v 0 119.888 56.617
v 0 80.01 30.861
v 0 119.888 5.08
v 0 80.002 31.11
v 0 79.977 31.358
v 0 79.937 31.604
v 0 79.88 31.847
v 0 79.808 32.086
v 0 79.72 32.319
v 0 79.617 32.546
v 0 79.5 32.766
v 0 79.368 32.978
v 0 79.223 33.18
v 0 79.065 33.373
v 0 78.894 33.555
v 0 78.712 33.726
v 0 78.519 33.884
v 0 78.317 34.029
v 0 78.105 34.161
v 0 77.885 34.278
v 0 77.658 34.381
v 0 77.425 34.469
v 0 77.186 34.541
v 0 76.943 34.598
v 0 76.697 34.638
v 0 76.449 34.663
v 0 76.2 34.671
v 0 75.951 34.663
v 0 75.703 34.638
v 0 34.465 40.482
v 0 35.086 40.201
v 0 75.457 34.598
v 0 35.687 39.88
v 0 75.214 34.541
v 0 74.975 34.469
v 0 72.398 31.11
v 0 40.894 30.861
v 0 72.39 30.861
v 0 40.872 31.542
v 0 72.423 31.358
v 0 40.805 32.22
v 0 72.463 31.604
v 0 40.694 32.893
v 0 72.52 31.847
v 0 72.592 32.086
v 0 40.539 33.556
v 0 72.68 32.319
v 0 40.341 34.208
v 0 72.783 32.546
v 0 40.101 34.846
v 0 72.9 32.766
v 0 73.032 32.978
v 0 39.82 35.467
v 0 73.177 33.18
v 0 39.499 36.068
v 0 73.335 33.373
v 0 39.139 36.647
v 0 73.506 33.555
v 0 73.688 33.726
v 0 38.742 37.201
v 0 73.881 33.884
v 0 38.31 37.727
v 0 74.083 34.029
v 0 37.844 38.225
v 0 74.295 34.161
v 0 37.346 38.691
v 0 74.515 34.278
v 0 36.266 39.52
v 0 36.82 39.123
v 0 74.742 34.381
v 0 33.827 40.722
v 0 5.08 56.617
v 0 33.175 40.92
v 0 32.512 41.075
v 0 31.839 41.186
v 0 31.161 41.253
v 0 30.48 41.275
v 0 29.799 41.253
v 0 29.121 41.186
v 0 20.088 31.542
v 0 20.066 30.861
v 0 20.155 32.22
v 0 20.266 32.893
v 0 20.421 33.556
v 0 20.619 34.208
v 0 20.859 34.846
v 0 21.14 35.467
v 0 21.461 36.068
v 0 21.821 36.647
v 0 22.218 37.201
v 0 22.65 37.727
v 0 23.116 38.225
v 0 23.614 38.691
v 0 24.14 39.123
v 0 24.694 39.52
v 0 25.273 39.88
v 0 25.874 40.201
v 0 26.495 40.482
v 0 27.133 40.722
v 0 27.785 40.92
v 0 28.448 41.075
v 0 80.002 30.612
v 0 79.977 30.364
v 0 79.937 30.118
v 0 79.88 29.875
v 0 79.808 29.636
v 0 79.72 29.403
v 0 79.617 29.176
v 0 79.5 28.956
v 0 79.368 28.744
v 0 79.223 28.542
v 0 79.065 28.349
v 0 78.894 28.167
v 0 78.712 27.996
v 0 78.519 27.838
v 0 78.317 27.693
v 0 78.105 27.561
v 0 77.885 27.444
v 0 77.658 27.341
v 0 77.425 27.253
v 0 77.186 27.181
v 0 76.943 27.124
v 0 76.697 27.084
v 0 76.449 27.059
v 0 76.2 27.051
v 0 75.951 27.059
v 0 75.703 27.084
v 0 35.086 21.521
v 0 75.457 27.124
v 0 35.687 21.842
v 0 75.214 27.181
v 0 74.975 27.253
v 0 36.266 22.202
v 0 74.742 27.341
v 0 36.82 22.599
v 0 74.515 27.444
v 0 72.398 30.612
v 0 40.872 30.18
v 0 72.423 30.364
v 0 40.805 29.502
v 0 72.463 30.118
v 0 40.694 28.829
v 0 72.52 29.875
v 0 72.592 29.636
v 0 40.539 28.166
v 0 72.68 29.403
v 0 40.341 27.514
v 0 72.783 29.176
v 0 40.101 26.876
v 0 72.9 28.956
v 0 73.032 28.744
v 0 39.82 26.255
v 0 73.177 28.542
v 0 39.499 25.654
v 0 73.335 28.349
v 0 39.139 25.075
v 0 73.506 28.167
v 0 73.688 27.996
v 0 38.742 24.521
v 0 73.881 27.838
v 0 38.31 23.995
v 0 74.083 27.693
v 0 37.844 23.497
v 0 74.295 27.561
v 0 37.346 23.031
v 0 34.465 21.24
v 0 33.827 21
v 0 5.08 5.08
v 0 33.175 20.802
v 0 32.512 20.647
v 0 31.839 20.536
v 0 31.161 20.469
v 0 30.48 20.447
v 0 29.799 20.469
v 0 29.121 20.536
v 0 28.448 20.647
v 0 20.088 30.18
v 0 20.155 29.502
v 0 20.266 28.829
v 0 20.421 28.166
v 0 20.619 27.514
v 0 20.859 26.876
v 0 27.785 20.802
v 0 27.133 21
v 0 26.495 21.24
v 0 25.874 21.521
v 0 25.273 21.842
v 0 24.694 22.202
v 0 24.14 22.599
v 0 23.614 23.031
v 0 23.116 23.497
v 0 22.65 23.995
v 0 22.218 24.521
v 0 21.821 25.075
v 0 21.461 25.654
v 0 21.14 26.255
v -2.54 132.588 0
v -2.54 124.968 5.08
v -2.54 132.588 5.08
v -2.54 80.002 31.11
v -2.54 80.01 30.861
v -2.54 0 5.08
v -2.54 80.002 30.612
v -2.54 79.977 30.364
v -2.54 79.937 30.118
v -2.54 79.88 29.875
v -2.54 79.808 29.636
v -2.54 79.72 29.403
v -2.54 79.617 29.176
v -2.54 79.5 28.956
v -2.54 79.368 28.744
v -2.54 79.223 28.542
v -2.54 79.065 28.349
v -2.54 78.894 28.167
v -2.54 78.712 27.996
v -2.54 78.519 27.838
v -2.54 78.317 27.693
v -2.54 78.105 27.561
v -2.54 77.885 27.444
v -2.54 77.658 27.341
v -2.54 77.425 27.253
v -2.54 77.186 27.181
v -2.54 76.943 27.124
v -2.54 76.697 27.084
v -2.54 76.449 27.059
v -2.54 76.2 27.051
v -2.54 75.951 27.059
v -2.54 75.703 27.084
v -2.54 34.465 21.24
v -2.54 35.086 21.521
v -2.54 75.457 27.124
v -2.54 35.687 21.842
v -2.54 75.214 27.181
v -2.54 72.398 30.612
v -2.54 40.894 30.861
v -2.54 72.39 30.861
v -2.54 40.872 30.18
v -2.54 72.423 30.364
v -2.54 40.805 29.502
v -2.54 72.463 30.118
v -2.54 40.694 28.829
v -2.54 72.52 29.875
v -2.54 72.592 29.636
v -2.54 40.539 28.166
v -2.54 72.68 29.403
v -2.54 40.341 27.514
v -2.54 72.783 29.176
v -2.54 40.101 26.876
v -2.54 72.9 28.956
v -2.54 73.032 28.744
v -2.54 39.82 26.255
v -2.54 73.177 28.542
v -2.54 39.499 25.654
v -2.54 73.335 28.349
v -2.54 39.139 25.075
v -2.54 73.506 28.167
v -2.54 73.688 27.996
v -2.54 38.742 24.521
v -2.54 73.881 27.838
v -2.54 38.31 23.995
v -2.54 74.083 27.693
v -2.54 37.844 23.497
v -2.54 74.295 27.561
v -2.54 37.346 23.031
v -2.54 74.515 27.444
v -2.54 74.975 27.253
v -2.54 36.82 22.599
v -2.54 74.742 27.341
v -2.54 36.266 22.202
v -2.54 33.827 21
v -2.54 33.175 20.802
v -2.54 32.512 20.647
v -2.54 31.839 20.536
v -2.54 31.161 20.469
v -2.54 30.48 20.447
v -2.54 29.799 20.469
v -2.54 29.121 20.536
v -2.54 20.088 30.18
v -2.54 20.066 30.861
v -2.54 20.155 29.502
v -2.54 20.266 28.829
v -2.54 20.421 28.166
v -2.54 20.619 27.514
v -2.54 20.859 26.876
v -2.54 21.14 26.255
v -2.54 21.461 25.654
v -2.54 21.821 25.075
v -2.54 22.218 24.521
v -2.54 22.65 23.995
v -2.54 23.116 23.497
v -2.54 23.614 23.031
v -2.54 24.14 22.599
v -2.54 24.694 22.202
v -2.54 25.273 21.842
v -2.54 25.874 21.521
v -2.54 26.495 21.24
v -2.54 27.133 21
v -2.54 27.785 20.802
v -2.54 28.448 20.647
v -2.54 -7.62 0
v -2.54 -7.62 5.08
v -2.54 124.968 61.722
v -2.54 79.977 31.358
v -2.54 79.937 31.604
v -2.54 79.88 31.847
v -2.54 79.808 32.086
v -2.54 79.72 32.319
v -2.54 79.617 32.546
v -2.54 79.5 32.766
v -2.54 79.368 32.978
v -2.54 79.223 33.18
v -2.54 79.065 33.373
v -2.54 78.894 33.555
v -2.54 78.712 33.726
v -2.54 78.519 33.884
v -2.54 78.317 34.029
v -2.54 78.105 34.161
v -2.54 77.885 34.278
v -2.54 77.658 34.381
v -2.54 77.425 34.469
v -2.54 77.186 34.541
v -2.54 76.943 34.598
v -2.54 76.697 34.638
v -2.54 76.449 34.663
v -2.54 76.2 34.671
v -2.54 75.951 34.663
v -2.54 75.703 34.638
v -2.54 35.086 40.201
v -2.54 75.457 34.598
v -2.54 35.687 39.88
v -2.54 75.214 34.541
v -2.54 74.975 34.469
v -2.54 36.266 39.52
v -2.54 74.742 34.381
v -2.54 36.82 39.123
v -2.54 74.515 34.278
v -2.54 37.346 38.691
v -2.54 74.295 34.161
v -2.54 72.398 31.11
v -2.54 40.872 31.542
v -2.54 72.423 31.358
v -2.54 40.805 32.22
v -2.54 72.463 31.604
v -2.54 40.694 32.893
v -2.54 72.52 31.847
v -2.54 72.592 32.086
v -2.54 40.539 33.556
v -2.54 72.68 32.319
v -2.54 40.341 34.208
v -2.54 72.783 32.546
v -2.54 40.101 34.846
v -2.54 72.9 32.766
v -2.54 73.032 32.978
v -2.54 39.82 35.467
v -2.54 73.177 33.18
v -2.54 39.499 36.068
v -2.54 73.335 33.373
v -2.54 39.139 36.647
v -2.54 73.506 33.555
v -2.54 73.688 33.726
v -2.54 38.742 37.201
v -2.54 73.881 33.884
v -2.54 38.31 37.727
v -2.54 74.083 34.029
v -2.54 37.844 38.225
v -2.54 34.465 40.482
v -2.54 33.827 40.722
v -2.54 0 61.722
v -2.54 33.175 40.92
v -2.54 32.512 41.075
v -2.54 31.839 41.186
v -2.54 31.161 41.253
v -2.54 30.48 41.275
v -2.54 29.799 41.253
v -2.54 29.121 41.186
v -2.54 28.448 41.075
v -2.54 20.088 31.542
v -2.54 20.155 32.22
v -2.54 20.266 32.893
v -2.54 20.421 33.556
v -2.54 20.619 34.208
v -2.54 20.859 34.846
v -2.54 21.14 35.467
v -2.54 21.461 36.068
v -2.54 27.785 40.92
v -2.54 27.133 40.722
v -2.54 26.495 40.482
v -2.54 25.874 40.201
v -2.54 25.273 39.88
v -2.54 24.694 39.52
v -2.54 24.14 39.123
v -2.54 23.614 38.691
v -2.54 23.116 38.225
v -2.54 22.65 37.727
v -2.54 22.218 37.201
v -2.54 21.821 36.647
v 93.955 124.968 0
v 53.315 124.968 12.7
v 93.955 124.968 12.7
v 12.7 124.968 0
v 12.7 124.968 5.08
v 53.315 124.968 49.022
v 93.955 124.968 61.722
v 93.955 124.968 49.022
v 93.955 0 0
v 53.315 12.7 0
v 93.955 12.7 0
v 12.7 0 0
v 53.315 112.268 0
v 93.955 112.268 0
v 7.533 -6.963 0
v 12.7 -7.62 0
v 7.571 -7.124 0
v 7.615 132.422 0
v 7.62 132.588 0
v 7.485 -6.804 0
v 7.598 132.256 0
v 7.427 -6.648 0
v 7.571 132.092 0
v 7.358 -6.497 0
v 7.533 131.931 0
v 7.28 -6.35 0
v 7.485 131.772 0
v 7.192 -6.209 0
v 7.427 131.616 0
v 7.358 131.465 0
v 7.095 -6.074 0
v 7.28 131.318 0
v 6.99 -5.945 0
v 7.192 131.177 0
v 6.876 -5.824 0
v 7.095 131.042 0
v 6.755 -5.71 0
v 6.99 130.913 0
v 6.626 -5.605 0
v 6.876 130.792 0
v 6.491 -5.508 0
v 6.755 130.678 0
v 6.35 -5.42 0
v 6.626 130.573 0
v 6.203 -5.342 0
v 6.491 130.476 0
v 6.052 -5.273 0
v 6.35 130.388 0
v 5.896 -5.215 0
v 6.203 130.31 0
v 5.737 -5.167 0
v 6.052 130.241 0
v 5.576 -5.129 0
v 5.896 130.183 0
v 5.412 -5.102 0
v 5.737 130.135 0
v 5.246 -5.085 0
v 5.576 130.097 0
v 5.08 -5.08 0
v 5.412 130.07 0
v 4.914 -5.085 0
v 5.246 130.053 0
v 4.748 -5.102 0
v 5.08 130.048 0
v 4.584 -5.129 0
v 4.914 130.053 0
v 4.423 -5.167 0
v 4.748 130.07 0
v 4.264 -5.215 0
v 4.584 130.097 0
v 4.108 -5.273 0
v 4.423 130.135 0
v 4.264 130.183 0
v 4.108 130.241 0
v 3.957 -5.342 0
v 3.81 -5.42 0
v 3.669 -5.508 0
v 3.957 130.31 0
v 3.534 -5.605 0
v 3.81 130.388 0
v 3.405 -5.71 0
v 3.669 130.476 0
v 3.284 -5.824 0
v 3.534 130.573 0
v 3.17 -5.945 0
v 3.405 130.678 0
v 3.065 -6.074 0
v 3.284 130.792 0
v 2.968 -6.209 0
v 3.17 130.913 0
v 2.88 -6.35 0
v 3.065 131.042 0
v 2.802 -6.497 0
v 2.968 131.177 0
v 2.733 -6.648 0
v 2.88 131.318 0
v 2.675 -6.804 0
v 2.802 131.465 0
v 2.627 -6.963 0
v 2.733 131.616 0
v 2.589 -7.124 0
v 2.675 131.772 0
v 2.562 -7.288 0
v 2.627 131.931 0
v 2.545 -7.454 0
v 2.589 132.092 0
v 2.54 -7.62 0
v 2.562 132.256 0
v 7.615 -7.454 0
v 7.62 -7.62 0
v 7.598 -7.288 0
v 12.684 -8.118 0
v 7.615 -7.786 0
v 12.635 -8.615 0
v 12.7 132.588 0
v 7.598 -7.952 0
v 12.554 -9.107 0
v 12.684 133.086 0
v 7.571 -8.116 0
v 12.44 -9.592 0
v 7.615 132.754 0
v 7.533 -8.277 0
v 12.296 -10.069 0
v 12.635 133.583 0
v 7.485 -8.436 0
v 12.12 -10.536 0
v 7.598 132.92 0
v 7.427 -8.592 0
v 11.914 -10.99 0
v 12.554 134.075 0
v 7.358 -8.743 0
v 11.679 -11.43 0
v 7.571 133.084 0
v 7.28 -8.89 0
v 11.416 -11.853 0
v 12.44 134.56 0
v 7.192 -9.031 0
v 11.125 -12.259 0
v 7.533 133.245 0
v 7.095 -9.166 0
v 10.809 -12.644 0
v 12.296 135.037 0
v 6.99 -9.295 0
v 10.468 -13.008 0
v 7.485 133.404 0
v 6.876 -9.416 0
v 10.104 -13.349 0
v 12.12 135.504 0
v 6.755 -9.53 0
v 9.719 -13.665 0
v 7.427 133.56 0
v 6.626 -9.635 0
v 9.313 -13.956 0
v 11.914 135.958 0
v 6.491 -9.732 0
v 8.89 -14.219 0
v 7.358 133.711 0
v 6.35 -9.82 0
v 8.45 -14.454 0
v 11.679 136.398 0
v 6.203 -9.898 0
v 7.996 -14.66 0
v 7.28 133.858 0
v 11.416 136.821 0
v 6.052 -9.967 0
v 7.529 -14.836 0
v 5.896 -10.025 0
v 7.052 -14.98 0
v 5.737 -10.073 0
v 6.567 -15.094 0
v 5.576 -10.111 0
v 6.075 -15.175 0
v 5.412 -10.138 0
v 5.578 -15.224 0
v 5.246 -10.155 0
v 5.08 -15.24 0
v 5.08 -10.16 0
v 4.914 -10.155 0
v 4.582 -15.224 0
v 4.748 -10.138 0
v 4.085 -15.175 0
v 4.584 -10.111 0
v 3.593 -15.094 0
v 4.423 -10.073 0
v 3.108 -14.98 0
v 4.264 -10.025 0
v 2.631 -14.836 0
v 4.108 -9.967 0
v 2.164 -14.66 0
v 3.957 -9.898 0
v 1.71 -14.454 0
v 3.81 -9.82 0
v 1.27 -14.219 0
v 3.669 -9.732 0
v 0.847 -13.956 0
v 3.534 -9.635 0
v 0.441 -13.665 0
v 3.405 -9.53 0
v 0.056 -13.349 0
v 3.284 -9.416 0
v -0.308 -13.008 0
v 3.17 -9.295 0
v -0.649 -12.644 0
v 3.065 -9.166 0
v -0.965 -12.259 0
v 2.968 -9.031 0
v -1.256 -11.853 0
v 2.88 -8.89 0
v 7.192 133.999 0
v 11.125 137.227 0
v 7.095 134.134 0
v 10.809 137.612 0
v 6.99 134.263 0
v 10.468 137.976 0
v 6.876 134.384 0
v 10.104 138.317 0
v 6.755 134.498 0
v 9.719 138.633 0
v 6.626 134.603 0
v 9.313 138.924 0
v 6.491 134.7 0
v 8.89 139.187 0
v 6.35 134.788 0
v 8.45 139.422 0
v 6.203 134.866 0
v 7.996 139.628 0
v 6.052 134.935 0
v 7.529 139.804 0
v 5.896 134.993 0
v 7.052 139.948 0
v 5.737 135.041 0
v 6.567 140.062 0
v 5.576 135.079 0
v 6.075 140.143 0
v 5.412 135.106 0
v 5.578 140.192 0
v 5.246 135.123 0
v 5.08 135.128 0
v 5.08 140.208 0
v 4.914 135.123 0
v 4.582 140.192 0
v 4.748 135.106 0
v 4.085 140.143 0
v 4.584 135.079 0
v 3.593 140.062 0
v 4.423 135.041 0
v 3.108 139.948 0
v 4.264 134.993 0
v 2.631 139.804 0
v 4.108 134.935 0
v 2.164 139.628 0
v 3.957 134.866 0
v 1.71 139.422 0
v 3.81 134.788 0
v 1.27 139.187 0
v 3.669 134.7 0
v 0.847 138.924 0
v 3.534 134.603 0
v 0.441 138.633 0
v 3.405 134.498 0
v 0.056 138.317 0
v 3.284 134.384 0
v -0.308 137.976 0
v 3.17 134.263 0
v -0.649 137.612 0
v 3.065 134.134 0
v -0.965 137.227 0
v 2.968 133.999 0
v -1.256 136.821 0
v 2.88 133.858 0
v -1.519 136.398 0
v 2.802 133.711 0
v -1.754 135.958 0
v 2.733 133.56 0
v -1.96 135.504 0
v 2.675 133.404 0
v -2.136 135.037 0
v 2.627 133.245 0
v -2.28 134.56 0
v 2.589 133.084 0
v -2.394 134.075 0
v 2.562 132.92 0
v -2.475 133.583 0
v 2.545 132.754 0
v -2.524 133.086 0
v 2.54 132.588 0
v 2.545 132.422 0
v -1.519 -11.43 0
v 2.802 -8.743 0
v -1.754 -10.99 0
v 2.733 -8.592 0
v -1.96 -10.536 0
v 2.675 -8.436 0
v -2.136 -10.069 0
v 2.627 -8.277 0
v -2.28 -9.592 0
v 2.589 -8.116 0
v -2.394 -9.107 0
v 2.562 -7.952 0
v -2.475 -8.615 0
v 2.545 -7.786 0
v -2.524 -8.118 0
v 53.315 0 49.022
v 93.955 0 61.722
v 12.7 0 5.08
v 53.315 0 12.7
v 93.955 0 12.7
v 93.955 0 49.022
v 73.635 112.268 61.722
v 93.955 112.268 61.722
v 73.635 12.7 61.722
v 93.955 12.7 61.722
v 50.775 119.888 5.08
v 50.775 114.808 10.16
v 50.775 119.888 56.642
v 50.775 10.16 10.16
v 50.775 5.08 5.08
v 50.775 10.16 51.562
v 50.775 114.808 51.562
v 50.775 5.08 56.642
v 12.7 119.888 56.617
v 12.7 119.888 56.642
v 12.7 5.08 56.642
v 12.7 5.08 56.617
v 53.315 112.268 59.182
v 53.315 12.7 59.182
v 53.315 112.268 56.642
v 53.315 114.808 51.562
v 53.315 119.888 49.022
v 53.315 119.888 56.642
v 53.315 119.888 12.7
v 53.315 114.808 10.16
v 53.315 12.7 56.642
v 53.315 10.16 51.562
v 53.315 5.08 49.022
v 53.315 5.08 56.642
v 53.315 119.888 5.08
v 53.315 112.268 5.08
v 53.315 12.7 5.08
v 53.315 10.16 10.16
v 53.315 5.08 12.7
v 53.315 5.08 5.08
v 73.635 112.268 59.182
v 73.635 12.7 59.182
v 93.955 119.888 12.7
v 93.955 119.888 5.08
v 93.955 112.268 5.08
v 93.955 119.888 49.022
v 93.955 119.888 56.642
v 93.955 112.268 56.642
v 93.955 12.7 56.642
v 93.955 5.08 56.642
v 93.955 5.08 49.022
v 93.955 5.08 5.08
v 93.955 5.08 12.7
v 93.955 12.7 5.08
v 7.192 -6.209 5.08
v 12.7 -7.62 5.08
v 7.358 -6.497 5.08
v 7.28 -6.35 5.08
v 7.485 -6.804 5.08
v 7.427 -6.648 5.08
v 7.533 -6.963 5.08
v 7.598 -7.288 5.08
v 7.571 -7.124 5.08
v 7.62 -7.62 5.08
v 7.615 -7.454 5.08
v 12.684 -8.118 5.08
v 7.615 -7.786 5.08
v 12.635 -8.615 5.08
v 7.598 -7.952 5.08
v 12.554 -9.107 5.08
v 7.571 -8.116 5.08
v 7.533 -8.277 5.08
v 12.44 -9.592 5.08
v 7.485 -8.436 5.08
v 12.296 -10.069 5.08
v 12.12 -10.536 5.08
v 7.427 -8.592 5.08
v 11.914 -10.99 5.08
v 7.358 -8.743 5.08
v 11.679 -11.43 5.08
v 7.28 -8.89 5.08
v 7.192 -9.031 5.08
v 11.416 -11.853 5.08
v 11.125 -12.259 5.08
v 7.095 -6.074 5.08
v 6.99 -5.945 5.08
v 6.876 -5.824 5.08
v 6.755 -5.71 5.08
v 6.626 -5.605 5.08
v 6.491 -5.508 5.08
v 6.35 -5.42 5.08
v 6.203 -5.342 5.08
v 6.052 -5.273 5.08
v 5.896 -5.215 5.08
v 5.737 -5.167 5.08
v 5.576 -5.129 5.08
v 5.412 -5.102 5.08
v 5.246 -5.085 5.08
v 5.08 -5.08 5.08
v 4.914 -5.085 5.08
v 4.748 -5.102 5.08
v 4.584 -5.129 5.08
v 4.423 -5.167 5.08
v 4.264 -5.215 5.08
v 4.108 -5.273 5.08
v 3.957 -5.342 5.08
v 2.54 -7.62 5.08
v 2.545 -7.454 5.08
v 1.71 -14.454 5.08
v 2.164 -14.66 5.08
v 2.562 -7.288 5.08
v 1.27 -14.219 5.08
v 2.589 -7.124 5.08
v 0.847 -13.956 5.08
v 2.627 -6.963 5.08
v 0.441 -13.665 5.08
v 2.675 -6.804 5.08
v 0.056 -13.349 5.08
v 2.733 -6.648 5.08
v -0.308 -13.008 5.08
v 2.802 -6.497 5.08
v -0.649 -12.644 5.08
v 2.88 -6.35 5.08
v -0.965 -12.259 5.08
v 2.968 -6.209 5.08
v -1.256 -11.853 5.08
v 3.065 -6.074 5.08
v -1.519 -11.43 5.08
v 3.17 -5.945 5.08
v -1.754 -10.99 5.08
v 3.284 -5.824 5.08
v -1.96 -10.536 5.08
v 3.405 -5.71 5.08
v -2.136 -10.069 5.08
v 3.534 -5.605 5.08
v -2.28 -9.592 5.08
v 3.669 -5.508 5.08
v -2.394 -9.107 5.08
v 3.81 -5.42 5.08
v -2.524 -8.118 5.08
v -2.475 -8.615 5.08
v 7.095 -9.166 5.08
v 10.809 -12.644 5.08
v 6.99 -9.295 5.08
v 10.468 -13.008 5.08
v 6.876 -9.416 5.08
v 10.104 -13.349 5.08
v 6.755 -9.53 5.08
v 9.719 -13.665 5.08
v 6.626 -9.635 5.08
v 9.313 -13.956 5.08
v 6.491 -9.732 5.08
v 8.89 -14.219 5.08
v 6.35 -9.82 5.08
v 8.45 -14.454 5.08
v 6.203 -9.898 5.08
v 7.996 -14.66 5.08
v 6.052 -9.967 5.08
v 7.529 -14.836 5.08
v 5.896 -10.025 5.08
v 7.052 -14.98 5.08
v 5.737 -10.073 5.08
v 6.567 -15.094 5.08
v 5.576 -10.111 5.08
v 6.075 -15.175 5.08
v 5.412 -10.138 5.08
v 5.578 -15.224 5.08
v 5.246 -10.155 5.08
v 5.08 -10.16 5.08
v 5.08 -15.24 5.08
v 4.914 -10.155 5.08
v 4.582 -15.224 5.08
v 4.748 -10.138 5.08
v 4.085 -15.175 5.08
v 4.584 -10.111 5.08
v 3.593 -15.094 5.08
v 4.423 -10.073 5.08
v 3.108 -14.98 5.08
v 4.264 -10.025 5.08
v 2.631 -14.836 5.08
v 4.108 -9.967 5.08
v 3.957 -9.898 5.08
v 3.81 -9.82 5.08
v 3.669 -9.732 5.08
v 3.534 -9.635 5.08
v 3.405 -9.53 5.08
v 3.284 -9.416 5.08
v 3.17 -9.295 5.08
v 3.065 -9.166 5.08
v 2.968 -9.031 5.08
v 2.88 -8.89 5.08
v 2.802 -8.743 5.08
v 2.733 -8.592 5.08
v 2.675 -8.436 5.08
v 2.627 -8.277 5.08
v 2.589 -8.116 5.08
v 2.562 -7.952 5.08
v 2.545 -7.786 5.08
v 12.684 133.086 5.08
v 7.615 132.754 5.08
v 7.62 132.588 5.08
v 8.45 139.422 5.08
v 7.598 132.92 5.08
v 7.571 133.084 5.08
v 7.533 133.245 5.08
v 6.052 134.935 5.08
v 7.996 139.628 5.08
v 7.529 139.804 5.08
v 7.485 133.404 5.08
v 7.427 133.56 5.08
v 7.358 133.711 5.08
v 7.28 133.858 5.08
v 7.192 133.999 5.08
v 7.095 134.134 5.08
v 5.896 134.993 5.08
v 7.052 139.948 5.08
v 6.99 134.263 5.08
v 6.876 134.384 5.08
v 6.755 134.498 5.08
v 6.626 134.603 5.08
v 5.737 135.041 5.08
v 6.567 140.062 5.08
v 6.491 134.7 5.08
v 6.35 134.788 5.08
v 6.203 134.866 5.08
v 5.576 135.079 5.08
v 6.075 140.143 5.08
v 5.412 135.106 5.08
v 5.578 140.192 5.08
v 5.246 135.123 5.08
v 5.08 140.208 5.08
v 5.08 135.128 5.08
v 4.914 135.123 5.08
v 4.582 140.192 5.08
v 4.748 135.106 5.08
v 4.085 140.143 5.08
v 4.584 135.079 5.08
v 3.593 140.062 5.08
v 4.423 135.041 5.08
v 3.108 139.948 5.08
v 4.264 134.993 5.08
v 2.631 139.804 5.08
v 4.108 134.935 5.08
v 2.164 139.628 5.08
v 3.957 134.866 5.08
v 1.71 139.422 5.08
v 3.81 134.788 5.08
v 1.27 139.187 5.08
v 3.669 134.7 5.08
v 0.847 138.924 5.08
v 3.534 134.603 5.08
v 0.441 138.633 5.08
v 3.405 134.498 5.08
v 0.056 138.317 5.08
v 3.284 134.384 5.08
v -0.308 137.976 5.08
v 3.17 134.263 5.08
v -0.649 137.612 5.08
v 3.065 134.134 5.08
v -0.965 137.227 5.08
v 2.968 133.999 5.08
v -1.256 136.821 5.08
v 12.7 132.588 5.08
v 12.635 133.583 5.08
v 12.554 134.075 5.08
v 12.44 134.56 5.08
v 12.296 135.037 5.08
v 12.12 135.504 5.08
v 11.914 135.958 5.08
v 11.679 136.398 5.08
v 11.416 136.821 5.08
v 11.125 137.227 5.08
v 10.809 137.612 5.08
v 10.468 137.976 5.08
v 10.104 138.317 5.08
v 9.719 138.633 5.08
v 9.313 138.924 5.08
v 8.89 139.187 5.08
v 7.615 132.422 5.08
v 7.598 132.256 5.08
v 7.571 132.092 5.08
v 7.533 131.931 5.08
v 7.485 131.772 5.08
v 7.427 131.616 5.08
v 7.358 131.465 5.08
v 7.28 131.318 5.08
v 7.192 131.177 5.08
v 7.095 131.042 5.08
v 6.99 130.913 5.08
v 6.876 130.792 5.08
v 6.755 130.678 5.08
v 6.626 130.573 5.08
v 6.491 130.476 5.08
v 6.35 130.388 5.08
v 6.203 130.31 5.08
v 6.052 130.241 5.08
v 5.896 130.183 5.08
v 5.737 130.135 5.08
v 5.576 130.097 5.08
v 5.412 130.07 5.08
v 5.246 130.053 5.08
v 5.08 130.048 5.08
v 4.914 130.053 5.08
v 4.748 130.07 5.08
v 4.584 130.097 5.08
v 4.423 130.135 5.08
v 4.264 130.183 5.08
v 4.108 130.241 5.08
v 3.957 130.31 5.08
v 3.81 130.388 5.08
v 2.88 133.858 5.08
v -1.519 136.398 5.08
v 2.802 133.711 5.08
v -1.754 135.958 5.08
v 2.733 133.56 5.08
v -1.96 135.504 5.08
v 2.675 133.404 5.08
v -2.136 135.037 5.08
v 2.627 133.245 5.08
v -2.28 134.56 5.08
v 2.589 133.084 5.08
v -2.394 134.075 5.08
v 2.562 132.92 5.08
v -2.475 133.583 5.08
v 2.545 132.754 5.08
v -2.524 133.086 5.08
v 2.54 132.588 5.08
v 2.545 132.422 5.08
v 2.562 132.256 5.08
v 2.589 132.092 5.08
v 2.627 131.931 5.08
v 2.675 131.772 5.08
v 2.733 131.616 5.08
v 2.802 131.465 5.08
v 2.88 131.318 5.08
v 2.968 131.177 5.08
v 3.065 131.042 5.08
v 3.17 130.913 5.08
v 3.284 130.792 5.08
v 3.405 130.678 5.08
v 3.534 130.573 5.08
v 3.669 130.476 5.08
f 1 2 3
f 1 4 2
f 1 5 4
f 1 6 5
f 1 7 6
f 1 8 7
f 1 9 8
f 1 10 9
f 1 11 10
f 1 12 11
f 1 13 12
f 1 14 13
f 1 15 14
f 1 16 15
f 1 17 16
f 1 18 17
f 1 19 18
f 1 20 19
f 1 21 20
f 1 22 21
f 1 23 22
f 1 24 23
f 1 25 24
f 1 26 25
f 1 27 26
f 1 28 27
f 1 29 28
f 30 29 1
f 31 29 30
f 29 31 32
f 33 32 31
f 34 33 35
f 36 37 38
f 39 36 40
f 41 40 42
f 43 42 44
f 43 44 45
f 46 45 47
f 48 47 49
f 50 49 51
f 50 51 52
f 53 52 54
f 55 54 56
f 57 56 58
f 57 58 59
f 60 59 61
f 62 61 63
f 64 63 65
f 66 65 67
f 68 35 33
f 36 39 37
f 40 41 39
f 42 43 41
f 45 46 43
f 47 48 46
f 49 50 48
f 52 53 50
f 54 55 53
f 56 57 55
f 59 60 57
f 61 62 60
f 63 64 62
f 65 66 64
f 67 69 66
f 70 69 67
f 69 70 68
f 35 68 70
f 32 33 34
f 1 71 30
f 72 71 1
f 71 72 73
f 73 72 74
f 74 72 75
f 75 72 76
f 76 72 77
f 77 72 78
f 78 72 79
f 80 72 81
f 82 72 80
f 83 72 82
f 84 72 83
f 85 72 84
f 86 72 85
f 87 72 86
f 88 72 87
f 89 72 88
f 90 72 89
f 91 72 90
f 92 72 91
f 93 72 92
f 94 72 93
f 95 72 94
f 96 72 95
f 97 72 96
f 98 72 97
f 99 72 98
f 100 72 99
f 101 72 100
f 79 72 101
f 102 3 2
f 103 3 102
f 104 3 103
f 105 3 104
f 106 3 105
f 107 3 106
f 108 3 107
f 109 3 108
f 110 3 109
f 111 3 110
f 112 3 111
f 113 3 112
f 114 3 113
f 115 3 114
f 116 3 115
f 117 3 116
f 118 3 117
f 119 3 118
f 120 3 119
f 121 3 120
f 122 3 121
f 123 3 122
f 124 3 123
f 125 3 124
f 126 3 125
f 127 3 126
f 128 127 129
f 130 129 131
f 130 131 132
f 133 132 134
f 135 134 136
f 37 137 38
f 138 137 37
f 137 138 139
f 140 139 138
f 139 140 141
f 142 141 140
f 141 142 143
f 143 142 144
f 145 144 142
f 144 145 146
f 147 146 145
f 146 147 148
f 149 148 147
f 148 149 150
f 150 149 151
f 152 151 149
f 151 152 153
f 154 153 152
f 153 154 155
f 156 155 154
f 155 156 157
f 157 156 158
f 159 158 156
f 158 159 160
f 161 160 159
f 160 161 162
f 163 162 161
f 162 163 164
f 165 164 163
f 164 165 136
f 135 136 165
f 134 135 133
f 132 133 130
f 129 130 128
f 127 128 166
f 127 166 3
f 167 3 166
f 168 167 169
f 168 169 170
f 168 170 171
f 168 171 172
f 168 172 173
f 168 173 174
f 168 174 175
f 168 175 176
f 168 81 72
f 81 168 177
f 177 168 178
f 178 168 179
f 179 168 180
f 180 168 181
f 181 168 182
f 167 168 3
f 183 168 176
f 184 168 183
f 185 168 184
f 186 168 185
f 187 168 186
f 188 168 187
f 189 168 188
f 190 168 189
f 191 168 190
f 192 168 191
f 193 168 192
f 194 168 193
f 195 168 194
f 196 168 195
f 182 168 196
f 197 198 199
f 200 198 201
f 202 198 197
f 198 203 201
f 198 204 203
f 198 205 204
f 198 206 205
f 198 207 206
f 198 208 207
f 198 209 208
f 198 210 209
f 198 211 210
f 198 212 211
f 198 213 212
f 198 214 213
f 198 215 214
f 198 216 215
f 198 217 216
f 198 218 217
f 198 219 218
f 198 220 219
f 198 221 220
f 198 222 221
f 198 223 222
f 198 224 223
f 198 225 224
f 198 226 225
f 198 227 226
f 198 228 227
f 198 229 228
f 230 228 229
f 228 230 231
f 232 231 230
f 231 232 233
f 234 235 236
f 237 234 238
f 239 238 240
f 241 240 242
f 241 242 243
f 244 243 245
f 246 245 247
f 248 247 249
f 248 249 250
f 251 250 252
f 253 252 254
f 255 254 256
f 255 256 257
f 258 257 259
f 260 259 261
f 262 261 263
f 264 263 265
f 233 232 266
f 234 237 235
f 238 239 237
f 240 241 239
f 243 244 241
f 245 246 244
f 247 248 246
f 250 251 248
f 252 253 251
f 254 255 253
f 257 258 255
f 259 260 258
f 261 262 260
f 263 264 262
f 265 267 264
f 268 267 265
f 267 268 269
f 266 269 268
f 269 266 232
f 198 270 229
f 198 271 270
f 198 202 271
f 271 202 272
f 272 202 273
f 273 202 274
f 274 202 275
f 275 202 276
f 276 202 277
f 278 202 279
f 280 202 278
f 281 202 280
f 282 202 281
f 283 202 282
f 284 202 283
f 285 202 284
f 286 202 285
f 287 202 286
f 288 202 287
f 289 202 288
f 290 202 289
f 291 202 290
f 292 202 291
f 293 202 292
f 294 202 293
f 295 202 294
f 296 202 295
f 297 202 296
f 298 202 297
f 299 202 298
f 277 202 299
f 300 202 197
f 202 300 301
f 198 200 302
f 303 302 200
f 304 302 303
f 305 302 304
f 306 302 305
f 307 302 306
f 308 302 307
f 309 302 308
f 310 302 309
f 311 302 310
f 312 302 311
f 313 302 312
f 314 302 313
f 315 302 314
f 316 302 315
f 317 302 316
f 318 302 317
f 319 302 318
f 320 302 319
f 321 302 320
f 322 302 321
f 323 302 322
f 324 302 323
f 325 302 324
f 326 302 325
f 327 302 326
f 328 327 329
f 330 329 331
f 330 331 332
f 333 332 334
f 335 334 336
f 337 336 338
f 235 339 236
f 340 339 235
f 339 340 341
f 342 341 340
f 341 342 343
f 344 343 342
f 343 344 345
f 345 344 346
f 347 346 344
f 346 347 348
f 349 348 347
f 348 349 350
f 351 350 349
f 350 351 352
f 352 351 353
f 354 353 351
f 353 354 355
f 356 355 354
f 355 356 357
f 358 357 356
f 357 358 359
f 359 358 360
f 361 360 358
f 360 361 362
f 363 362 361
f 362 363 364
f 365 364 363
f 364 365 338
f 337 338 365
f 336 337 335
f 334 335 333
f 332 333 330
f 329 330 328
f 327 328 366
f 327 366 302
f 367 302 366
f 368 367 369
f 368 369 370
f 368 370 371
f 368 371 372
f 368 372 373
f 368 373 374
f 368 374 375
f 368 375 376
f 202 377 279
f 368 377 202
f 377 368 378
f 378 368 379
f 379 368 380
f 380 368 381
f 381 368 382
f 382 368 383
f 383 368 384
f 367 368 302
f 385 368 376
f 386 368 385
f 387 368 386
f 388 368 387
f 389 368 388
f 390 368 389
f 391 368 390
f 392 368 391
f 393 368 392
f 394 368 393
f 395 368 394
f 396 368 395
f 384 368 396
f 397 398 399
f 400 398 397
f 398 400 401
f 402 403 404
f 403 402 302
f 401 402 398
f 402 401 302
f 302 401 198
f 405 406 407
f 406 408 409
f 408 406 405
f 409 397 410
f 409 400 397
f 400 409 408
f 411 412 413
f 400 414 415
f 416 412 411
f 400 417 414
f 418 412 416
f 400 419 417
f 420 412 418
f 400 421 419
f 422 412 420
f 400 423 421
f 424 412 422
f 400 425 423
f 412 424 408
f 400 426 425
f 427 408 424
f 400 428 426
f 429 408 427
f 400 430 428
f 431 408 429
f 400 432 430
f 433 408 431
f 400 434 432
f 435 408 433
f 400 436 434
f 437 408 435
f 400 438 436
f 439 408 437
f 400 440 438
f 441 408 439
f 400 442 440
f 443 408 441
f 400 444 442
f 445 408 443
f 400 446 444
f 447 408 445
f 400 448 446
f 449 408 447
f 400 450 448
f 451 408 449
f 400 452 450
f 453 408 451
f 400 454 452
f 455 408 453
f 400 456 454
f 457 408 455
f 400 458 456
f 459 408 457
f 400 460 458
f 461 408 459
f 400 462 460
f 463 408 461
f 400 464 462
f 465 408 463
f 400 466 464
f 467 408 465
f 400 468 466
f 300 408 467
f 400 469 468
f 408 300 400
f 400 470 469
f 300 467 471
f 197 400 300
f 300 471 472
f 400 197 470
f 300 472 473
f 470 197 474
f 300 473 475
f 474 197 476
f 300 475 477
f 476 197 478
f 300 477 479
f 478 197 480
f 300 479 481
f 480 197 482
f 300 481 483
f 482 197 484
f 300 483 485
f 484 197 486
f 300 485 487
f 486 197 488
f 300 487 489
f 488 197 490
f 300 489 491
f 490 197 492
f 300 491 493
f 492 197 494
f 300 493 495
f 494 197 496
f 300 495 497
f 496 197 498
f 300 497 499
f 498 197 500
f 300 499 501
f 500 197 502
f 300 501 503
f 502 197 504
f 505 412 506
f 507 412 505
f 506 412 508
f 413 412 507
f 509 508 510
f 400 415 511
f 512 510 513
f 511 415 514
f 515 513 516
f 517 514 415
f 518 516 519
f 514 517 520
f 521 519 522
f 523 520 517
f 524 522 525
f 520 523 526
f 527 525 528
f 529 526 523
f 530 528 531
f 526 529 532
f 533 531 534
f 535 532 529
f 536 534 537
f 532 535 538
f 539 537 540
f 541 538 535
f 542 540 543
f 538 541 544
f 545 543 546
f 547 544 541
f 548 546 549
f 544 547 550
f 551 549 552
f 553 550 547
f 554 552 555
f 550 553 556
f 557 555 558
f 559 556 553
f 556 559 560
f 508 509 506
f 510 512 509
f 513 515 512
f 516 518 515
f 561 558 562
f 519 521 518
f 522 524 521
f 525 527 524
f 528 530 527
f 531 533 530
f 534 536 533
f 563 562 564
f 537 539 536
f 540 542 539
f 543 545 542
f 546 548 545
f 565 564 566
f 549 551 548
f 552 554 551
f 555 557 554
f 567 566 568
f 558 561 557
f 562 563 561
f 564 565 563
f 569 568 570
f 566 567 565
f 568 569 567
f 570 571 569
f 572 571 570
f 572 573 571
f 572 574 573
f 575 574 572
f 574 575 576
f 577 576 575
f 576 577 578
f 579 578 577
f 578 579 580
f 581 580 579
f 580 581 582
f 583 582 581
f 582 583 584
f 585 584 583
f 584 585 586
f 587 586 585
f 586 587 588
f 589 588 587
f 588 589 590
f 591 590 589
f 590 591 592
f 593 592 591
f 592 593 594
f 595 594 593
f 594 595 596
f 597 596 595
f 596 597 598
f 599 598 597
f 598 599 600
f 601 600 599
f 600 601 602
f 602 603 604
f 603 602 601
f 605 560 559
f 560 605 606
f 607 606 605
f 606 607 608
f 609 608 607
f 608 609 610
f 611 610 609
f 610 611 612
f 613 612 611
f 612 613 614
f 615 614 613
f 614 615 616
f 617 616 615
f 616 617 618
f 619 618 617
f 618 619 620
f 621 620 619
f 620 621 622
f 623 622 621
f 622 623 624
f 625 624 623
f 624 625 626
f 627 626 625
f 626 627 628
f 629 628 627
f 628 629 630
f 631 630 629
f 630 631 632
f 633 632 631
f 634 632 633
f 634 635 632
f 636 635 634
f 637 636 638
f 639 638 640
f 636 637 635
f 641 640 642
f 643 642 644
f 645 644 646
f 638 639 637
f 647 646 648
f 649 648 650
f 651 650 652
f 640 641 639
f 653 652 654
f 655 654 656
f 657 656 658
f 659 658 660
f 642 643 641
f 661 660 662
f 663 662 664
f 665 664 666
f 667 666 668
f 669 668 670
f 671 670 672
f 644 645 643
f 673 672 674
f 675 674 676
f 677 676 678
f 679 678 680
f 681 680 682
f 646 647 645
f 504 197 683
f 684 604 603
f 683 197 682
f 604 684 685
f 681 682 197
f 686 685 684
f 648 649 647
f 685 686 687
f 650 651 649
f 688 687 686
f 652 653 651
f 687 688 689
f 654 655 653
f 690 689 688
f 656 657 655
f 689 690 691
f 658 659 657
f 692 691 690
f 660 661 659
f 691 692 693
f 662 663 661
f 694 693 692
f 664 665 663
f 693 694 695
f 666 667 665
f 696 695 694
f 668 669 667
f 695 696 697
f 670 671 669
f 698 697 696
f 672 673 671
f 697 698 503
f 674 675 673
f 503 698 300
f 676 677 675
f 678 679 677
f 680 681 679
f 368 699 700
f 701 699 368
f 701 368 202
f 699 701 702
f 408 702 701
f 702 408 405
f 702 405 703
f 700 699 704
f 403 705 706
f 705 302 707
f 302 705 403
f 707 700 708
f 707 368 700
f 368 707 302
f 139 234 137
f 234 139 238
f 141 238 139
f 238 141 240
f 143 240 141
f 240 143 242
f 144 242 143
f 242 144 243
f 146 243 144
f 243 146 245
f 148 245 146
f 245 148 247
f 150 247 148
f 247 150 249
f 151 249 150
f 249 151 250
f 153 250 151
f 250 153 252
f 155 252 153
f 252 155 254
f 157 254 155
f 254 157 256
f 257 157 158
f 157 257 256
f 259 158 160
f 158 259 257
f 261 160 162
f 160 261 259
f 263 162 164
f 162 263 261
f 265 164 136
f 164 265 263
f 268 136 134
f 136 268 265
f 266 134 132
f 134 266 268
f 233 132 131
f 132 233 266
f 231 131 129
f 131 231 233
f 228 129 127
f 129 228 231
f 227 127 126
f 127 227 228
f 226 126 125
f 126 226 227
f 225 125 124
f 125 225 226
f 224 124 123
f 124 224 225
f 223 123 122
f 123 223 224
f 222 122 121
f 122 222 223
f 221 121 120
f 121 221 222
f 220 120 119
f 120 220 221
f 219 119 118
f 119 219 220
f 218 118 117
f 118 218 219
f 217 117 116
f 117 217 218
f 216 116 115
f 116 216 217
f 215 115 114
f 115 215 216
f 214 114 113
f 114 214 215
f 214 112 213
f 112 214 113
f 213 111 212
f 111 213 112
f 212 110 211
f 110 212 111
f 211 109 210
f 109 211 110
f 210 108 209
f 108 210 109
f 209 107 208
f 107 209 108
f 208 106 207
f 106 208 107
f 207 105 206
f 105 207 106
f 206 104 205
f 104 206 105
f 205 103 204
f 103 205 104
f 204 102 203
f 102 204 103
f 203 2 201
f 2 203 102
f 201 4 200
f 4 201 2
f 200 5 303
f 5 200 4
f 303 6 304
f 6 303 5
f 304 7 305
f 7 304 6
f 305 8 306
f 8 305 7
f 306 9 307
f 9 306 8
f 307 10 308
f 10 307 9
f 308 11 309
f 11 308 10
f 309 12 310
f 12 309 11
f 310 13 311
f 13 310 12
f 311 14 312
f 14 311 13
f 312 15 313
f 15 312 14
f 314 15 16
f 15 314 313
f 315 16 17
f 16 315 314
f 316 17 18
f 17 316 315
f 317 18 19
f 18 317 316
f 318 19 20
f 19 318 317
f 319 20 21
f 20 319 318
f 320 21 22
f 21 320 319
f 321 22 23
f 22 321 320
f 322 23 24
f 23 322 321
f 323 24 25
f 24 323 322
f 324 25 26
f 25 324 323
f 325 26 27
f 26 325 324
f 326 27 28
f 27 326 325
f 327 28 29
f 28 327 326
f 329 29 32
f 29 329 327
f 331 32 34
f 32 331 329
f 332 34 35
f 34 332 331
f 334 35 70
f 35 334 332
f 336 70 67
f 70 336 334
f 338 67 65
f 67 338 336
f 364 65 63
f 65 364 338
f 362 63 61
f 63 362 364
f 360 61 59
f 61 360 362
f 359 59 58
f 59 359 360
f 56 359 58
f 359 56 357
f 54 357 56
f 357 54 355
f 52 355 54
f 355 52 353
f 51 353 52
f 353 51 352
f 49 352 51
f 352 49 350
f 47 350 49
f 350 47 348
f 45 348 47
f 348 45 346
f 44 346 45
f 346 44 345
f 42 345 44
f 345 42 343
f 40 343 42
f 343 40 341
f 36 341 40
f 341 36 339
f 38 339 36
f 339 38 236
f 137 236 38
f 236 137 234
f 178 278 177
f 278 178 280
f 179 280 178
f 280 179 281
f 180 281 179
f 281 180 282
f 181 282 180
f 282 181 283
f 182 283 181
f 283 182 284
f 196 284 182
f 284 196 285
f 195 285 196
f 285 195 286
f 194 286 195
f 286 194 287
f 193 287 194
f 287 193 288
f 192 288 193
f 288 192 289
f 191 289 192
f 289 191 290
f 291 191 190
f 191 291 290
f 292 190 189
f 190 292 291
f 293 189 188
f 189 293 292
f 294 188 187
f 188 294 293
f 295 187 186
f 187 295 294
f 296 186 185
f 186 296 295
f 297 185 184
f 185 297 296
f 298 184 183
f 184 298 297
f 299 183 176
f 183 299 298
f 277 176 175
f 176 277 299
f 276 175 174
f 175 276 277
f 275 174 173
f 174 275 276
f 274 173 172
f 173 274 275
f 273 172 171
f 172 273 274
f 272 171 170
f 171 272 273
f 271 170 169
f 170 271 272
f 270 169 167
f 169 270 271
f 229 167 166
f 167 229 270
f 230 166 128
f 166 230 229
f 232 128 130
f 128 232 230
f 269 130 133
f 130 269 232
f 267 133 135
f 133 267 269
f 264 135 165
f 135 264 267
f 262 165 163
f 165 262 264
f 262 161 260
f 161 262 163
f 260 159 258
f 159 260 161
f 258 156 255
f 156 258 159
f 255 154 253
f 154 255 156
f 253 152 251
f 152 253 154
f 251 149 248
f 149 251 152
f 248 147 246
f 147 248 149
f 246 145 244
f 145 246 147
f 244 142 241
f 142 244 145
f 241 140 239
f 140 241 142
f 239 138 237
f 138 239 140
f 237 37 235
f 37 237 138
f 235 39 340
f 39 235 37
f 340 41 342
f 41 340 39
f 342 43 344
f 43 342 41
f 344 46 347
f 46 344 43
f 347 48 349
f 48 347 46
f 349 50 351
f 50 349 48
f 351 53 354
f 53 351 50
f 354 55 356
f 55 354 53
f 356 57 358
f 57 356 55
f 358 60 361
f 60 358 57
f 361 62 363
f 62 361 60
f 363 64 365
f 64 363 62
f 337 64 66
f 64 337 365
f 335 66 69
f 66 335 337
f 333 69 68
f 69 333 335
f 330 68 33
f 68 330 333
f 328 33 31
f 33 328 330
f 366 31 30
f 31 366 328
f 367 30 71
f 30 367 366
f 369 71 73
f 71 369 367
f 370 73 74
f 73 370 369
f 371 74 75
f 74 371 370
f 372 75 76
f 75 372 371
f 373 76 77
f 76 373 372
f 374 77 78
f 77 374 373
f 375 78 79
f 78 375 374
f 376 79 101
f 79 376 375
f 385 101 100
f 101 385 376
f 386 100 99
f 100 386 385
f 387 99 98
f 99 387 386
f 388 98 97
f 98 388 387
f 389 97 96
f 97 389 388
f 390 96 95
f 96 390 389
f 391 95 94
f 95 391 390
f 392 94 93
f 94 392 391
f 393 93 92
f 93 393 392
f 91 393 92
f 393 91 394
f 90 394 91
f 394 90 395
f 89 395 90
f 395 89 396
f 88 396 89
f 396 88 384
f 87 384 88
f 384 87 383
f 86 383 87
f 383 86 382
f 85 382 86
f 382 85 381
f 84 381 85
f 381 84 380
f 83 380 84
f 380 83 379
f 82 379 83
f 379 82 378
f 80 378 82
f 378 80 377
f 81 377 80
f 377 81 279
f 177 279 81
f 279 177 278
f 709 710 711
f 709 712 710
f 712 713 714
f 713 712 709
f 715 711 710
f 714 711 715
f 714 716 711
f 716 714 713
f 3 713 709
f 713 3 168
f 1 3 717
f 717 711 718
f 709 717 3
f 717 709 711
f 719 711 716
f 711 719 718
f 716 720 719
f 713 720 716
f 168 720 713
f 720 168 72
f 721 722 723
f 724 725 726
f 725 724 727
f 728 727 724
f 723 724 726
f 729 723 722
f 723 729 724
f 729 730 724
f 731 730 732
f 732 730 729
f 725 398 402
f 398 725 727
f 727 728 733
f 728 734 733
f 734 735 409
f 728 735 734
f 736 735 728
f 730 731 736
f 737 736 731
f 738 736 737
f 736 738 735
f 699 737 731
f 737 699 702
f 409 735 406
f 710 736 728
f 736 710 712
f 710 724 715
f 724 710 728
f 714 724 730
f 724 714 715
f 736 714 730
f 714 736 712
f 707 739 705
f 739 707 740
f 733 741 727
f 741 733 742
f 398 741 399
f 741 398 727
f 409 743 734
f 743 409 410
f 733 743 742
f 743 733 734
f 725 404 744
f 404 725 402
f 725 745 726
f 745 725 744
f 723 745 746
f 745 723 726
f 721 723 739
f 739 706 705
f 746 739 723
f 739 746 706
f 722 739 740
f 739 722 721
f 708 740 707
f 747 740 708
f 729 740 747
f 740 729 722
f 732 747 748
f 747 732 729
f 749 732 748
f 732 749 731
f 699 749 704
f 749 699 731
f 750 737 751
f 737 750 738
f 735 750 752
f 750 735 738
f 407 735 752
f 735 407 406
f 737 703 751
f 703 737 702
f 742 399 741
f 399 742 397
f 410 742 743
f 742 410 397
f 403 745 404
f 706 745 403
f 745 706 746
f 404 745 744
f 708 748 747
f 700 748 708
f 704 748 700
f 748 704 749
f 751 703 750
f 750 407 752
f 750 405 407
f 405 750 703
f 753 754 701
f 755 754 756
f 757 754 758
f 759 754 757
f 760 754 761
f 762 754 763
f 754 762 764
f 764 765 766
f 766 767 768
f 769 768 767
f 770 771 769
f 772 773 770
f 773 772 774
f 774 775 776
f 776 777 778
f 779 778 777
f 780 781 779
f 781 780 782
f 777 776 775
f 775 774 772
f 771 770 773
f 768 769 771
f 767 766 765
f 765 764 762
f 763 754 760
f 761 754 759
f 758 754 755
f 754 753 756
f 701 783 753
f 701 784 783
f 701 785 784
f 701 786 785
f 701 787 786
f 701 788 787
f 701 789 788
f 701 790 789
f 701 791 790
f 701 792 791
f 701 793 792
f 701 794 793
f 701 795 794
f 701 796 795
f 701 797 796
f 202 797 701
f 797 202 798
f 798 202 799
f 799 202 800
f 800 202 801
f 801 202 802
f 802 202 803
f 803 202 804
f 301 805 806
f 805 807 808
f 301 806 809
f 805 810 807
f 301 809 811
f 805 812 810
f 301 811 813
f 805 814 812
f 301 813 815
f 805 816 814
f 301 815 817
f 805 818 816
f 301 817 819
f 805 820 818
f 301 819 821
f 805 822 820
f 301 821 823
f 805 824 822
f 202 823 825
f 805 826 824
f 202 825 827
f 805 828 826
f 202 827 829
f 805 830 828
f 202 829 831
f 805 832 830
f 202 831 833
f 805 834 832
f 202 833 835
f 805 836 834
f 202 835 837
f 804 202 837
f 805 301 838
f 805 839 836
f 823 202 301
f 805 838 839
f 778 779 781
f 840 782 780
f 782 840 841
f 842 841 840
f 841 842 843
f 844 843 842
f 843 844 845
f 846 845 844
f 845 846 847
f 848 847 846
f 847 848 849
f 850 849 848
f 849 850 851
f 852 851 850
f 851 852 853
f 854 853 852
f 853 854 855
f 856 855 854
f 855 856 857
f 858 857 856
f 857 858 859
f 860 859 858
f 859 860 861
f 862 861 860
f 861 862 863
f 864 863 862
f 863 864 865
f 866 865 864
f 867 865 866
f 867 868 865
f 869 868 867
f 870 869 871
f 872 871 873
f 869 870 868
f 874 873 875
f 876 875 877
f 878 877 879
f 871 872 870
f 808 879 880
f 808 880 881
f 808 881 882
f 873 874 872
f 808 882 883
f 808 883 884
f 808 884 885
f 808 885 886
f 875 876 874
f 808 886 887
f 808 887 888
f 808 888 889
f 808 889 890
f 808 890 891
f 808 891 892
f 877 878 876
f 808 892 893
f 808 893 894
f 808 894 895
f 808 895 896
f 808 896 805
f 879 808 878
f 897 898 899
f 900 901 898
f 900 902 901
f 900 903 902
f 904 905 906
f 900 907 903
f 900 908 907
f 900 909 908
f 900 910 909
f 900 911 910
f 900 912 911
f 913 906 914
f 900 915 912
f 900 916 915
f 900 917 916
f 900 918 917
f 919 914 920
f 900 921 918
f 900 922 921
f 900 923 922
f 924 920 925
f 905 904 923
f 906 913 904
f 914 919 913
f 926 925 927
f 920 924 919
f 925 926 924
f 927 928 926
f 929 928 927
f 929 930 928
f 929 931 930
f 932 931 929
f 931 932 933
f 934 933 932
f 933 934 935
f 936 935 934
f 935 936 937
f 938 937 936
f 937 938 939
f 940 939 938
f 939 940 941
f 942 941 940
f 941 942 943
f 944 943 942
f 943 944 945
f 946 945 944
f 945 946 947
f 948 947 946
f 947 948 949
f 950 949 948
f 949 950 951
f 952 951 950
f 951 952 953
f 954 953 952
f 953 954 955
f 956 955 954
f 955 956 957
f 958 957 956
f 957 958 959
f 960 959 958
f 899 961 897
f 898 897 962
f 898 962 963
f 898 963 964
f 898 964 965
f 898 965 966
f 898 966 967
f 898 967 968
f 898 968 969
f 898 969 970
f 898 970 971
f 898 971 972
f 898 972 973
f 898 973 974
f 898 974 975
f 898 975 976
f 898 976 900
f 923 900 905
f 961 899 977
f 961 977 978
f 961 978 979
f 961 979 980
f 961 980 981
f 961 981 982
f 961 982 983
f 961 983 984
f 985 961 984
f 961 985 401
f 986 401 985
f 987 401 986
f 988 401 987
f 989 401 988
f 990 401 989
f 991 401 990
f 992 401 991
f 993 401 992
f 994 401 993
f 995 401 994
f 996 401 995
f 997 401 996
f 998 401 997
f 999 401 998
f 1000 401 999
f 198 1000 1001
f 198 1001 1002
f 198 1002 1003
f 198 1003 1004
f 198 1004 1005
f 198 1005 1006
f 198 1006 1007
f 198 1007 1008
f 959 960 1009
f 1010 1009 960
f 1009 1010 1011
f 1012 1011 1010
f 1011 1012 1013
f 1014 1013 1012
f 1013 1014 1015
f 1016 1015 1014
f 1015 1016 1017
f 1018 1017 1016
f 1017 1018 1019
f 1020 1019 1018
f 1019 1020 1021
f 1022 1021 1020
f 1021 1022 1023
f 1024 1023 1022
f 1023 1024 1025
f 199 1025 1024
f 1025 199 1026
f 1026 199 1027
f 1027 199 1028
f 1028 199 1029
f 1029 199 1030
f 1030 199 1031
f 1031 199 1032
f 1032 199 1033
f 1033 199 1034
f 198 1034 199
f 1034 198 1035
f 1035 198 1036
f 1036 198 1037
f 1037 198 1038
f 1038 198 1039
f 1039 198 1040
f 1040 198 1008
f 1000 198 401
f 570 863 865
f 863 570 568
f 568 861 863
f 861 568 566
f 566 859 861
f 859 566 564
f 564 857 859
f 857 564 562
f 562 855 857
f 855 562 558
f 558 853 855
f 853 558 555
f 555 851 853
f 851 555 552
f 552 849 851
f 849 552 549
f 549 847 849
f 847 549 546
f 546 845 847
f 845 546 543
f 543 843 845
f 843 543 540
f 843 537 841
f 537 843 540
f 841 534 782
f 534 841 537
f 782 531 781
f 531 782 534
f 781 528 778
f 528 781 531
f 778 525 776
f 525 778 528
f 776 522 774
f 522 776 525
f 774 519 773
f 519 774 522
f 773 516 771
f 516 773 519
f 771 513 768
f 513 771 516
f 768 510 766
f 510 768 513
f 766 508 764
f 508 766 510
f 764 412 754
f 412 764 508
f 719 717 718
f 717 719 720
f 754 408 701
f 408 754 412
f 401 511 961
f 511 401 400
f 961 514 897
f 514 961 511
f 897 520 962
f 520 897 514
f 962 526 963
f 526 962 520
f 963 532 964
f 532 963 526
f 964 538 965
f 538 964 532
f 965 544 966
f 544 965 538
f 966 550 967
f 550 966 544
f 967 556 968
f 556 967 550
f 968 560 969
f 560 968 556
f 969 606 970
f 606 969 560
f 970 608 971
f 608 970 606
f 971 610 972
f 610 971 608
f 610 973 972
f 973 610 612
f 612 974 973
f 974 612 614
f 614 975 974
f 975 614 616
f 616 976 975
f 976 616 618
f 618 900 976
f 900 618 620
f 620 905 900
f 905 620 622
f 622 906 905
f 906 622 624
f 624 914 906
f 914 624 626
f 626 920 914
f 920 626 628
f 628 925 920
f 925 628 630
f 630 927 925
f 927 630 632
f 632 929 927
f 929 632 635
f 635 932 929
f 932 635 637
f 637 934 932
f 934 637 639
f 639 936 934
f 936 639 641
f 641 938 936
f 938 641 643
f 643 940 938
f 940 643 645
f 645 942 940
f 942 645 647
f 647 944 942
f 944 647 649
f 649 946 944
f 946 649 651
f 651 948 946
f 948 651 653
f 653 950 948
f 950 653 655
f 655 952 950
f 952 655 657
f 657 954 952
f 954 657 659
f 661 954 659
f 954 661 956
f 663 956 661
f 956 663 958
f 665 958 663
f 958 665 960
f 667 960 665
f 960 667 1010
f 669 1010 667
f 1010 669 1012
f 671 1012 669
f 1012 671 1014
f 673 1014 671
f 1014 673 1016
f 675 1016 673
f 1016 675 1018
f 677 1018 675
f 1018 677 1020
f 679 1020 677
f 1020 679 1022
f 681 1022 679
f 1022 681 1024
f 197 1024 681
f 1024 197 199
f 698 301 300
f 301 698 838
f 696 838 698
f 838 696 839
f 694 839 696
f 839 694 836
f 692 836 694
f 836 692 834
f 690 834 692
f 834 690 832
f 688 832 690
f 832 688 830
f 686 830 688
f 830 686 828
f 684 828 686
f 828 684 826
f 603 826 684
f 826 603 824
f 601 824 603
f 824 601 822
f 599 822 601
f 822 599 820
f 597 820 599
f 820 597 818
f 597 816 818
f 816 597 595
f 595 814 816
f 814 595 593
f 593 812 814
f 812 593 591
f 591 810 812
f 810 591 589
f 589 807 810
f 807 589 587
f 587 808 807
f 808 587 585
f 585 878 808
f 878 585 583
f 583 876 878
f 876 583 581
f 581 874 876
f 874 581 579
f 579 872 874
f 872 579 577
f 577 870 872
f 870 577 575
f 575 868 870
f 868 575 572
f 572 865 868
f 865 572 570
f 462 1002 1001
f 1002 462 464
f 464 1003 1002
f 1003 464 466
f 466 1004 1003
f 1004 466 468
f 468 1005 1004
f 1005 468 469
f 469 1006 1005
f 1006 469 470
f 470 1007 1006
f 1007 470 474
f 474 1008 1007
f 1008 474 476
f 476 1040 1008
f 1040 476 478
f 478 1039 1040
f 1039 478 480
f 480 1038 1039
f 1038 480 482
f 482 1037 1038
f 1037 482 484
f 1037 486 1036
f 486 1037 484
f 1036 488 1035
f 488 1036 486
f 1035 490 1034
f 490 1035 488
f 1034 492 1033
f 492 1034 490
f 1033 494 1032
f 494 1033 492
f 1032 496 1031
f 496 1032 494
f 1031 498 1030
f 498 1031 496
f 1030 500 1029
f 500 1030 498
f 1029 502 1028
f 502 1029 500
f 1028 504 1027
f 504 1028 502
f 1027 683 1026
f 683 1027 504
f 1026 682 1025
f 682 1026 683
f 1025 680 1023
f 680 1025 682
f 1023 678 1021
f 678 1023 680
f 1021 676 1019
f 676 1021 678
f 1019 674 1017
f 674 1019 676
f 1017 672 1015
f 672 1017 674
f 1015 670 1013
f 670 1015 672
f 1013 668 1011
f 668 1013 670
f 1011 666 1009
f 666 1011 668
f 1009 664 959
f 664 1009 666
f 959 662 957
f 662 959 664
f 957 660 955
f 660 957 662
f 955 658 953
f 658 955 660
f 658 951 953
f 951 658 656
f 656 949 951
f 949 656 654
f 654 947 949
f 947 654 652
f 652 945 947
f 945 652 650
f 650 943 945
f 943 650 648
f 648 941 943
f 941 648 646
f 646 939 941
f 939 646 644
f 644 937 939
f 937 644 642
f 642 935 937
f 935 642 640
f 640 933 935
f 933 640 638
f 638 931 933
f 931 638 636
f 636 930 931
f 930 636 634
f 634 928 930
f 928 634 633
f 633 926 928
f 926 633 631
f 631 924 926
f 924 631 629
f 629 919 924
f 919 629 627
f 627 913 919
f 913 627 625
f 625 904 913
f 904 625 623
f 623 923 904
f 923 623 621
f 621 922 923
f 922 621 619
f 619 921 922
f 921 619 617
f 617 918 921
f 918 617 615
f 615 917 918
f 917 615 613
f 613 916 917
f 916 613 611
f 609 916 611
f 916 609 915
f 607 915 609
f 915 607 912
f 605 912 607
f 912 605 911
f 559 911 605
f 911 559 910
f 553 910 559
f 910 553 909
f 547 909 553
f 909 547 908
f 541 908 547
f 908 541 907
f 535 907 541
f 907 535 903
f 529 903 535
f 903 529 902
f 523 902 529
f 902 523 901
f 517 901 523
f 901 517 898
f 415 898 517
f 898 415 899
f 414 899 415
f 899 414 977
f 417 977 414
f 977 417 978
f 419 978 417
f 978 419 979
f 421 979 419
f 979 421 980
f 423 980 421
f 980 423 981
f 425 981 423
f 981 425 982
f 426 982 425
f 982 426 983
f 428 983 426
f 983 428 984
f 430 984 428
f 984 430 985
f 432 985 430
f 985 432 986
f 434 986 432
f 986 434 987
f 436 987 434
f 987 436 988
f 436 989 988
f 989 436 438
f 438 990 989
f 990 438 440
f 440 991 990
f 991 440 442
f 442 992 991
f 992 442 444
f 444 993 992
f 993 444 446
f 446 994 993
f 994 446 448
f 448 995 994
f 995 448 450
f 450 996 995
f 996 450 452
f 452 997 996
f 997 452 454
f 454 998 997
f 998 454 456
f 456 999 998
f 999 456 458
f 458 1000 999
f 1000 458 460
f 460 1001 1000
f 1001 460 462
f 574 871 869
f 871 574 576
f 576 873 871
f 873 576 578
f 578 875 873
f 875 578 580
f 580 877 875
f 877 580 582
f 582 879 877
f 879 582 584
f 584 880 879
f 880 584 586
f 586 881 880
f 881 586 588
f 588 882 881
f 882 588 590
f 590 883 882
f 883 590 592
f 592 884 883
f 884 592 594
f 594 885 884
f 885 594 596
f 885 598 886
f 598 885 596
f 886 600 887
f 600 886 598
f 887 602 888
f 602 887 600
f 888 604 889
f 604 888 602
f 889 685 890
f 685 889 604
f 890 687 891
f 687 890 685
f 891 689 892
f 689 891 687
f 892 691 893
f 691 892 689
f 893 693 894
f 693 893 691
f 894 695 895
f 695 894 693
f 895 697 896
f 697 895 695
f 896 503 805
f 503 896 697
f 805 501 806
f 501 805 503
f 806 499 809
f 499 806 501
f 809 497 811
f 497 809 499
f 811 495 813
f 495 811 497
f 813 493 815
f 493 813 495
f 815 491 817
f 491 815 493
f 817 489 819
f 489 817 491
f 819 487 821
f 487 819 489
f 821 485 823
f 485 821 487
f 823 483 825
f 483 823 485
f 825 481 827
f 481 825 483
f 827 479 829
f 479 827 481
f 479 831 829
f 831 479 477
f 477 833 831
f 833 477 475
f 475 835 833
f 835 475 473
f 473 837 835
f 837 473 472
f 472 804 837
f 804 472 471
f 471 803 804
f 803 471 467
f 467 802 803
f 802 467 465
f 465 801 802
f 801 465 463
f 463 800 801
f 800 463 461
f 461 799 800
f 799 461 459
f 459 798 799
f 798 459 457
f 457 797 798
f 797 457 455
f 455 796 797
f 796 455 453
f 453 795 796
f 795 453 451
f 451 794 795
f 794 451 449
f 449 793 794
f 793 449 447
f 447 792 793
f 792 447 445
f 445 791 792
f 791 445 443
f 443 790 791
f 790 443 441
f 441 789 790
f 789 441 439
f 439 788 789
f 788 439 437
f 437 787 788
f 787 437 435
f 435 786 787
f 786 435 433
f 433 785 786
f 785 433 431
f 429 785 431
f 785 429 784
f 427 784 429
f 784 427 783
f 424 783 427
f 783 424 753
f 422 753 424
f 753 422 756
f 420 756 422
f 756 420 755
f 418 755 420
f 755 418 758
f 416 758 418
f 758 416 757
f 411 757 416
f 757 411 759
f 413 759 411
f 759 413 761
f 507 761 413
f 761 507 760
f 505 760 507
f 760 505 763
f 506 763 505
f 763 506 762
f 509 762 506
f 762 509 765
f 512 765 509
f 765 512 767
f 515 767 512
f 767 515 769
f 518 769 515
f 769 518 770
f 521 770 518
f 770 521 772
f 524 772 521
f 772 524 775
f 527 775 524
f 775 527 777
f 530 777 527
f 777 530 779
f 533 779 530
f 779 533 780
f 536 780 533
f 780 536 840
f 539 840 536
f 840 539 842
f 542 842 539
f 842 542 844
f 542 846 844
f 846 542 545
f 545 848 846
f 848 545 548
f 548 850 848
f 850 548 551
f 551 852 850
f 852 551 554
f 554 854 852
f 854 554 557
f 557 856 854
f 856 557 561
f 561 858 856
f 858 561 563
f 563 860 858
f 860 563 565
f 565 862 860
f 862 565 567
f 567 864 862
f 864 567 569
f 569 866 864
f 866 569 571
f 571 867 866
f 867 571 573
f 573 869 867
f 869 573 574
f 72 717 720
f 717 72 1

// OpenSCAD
ViewScale = [0.0254, 0.0254, 0.0254];

PSUL = 8500;
PSUW = 4480;
PSUH = 1970;
clearance = 20;
wallthick = 200;
ro=300;
ri=100;

module model_psu()
{
    color("cornflowerblue")
    linear_extrude(PSUH)
    square([PSUL, PSUW]);

    translate([0, 0, PSUH])
    color("lightblue")
    linear_extrude(100)
    {
        translate([1200, 650, 0])
        square([1270, 1000]);
        translate([1200, 2850, 0])
        square([1270, 1000]);
        translate([5330+1200, 3000, 0])
        circle(2250/2, $fn=96);

        translate([0, 0, 0])
        square([660, PSUW]);
    }
}

module oneclip()
{
    // Base
    linear_extrude(200)
    difference() {
        hull() {
            circle(ro, $fn=96);
            translate([0, 40+(wallthick*2)+PSUW+ro*2, 0])
            circle(ro, $fn=96);
        }
        circle(ri, $fn=96);
            translate([0, 40+(wallthick*2)+PSUW+ro*2, 0])
            circle(ri, $fn=96);
    }
    // Walls
    translate([0, 0, 199])
    linear_extrude(PSUH+60) {
        translate([-ro, ro, 0])
        square([ro*2, wallthick]);
        translate([-ro, 40+ro+wallthick+PSUW, 0])
        square([ro*2, wallthick]);
    }
    // Top
    translate([-ro, ro, 220+PSUH+40-1])
    linear_extrude(200)
    square([ro*2, PSUW+(wallthick*2) + 40]);
}

module endclip()
{
    w = PSUW+wallthick*2+40;
    h = PSUH+200+wallthick+60;
    rotate([0, -90, 0]) {
        linear_extrude(100)
        difference() {
            square([h, w]);
            translate([h/2, 1200,, 0])
            circle(820/2, $fn=96);
            translate([h/2, 3000, 0])
            circle(300/2, $fn=96);
        }
        translate([0, 0, -1999])
        linear_extrude(2000)
        difference() {
            square([h,w]);
            translate([wallthick, wallthick])
            square([h-wallthick*2, w-wallthick*2]);
        }
        translate([0, 0, -2099])
        linear_extrude(100)
        difference() {
            square([h,w]);
            translate([wallthick*2, wallthick*2])
            square([h-wallthick*4, w-wallthick*4]);
        }
        translate([0, 0, -2899])
        linear_extrude(800)
        difference() {
            square([h,w]);
            translate([wallthick, wallthick])
            square([h-wallthick*2, w-wallthick*2]);

            translate([500, -10, 0])
            square([h-1000, w+100]);

            translate([-200, 500, 0])
            square([h+100, w-1000]);
        }
        translate([0, 0, -3699])
        linear_extrude(800)
        difference() {
            square([h,w]);
            translate([wallthick, wallthick])
            square([h-wallthick*2, w-wallthick*2]);

            translate([500, -10, 0])
            square([h-1000, w+100]);

            translate([-10, 500, 0])
            square([h+100, w-1000]);
        }
    }
    translate([200, -ro, 0])
    oneclip();
}

module forViewing()
{
    translate([0, wallthick+20+ro, 220])
    model_psu();
    translate([-2200, ro, 0])
    endclip();
    *translate([6000, 0, 0])
    *oneclip();
}

module forPrinting()
{
    //oneclip();
    endclip();
}

scale(ViewScale)
{
    forPrinting();
//    forViewing();
}
